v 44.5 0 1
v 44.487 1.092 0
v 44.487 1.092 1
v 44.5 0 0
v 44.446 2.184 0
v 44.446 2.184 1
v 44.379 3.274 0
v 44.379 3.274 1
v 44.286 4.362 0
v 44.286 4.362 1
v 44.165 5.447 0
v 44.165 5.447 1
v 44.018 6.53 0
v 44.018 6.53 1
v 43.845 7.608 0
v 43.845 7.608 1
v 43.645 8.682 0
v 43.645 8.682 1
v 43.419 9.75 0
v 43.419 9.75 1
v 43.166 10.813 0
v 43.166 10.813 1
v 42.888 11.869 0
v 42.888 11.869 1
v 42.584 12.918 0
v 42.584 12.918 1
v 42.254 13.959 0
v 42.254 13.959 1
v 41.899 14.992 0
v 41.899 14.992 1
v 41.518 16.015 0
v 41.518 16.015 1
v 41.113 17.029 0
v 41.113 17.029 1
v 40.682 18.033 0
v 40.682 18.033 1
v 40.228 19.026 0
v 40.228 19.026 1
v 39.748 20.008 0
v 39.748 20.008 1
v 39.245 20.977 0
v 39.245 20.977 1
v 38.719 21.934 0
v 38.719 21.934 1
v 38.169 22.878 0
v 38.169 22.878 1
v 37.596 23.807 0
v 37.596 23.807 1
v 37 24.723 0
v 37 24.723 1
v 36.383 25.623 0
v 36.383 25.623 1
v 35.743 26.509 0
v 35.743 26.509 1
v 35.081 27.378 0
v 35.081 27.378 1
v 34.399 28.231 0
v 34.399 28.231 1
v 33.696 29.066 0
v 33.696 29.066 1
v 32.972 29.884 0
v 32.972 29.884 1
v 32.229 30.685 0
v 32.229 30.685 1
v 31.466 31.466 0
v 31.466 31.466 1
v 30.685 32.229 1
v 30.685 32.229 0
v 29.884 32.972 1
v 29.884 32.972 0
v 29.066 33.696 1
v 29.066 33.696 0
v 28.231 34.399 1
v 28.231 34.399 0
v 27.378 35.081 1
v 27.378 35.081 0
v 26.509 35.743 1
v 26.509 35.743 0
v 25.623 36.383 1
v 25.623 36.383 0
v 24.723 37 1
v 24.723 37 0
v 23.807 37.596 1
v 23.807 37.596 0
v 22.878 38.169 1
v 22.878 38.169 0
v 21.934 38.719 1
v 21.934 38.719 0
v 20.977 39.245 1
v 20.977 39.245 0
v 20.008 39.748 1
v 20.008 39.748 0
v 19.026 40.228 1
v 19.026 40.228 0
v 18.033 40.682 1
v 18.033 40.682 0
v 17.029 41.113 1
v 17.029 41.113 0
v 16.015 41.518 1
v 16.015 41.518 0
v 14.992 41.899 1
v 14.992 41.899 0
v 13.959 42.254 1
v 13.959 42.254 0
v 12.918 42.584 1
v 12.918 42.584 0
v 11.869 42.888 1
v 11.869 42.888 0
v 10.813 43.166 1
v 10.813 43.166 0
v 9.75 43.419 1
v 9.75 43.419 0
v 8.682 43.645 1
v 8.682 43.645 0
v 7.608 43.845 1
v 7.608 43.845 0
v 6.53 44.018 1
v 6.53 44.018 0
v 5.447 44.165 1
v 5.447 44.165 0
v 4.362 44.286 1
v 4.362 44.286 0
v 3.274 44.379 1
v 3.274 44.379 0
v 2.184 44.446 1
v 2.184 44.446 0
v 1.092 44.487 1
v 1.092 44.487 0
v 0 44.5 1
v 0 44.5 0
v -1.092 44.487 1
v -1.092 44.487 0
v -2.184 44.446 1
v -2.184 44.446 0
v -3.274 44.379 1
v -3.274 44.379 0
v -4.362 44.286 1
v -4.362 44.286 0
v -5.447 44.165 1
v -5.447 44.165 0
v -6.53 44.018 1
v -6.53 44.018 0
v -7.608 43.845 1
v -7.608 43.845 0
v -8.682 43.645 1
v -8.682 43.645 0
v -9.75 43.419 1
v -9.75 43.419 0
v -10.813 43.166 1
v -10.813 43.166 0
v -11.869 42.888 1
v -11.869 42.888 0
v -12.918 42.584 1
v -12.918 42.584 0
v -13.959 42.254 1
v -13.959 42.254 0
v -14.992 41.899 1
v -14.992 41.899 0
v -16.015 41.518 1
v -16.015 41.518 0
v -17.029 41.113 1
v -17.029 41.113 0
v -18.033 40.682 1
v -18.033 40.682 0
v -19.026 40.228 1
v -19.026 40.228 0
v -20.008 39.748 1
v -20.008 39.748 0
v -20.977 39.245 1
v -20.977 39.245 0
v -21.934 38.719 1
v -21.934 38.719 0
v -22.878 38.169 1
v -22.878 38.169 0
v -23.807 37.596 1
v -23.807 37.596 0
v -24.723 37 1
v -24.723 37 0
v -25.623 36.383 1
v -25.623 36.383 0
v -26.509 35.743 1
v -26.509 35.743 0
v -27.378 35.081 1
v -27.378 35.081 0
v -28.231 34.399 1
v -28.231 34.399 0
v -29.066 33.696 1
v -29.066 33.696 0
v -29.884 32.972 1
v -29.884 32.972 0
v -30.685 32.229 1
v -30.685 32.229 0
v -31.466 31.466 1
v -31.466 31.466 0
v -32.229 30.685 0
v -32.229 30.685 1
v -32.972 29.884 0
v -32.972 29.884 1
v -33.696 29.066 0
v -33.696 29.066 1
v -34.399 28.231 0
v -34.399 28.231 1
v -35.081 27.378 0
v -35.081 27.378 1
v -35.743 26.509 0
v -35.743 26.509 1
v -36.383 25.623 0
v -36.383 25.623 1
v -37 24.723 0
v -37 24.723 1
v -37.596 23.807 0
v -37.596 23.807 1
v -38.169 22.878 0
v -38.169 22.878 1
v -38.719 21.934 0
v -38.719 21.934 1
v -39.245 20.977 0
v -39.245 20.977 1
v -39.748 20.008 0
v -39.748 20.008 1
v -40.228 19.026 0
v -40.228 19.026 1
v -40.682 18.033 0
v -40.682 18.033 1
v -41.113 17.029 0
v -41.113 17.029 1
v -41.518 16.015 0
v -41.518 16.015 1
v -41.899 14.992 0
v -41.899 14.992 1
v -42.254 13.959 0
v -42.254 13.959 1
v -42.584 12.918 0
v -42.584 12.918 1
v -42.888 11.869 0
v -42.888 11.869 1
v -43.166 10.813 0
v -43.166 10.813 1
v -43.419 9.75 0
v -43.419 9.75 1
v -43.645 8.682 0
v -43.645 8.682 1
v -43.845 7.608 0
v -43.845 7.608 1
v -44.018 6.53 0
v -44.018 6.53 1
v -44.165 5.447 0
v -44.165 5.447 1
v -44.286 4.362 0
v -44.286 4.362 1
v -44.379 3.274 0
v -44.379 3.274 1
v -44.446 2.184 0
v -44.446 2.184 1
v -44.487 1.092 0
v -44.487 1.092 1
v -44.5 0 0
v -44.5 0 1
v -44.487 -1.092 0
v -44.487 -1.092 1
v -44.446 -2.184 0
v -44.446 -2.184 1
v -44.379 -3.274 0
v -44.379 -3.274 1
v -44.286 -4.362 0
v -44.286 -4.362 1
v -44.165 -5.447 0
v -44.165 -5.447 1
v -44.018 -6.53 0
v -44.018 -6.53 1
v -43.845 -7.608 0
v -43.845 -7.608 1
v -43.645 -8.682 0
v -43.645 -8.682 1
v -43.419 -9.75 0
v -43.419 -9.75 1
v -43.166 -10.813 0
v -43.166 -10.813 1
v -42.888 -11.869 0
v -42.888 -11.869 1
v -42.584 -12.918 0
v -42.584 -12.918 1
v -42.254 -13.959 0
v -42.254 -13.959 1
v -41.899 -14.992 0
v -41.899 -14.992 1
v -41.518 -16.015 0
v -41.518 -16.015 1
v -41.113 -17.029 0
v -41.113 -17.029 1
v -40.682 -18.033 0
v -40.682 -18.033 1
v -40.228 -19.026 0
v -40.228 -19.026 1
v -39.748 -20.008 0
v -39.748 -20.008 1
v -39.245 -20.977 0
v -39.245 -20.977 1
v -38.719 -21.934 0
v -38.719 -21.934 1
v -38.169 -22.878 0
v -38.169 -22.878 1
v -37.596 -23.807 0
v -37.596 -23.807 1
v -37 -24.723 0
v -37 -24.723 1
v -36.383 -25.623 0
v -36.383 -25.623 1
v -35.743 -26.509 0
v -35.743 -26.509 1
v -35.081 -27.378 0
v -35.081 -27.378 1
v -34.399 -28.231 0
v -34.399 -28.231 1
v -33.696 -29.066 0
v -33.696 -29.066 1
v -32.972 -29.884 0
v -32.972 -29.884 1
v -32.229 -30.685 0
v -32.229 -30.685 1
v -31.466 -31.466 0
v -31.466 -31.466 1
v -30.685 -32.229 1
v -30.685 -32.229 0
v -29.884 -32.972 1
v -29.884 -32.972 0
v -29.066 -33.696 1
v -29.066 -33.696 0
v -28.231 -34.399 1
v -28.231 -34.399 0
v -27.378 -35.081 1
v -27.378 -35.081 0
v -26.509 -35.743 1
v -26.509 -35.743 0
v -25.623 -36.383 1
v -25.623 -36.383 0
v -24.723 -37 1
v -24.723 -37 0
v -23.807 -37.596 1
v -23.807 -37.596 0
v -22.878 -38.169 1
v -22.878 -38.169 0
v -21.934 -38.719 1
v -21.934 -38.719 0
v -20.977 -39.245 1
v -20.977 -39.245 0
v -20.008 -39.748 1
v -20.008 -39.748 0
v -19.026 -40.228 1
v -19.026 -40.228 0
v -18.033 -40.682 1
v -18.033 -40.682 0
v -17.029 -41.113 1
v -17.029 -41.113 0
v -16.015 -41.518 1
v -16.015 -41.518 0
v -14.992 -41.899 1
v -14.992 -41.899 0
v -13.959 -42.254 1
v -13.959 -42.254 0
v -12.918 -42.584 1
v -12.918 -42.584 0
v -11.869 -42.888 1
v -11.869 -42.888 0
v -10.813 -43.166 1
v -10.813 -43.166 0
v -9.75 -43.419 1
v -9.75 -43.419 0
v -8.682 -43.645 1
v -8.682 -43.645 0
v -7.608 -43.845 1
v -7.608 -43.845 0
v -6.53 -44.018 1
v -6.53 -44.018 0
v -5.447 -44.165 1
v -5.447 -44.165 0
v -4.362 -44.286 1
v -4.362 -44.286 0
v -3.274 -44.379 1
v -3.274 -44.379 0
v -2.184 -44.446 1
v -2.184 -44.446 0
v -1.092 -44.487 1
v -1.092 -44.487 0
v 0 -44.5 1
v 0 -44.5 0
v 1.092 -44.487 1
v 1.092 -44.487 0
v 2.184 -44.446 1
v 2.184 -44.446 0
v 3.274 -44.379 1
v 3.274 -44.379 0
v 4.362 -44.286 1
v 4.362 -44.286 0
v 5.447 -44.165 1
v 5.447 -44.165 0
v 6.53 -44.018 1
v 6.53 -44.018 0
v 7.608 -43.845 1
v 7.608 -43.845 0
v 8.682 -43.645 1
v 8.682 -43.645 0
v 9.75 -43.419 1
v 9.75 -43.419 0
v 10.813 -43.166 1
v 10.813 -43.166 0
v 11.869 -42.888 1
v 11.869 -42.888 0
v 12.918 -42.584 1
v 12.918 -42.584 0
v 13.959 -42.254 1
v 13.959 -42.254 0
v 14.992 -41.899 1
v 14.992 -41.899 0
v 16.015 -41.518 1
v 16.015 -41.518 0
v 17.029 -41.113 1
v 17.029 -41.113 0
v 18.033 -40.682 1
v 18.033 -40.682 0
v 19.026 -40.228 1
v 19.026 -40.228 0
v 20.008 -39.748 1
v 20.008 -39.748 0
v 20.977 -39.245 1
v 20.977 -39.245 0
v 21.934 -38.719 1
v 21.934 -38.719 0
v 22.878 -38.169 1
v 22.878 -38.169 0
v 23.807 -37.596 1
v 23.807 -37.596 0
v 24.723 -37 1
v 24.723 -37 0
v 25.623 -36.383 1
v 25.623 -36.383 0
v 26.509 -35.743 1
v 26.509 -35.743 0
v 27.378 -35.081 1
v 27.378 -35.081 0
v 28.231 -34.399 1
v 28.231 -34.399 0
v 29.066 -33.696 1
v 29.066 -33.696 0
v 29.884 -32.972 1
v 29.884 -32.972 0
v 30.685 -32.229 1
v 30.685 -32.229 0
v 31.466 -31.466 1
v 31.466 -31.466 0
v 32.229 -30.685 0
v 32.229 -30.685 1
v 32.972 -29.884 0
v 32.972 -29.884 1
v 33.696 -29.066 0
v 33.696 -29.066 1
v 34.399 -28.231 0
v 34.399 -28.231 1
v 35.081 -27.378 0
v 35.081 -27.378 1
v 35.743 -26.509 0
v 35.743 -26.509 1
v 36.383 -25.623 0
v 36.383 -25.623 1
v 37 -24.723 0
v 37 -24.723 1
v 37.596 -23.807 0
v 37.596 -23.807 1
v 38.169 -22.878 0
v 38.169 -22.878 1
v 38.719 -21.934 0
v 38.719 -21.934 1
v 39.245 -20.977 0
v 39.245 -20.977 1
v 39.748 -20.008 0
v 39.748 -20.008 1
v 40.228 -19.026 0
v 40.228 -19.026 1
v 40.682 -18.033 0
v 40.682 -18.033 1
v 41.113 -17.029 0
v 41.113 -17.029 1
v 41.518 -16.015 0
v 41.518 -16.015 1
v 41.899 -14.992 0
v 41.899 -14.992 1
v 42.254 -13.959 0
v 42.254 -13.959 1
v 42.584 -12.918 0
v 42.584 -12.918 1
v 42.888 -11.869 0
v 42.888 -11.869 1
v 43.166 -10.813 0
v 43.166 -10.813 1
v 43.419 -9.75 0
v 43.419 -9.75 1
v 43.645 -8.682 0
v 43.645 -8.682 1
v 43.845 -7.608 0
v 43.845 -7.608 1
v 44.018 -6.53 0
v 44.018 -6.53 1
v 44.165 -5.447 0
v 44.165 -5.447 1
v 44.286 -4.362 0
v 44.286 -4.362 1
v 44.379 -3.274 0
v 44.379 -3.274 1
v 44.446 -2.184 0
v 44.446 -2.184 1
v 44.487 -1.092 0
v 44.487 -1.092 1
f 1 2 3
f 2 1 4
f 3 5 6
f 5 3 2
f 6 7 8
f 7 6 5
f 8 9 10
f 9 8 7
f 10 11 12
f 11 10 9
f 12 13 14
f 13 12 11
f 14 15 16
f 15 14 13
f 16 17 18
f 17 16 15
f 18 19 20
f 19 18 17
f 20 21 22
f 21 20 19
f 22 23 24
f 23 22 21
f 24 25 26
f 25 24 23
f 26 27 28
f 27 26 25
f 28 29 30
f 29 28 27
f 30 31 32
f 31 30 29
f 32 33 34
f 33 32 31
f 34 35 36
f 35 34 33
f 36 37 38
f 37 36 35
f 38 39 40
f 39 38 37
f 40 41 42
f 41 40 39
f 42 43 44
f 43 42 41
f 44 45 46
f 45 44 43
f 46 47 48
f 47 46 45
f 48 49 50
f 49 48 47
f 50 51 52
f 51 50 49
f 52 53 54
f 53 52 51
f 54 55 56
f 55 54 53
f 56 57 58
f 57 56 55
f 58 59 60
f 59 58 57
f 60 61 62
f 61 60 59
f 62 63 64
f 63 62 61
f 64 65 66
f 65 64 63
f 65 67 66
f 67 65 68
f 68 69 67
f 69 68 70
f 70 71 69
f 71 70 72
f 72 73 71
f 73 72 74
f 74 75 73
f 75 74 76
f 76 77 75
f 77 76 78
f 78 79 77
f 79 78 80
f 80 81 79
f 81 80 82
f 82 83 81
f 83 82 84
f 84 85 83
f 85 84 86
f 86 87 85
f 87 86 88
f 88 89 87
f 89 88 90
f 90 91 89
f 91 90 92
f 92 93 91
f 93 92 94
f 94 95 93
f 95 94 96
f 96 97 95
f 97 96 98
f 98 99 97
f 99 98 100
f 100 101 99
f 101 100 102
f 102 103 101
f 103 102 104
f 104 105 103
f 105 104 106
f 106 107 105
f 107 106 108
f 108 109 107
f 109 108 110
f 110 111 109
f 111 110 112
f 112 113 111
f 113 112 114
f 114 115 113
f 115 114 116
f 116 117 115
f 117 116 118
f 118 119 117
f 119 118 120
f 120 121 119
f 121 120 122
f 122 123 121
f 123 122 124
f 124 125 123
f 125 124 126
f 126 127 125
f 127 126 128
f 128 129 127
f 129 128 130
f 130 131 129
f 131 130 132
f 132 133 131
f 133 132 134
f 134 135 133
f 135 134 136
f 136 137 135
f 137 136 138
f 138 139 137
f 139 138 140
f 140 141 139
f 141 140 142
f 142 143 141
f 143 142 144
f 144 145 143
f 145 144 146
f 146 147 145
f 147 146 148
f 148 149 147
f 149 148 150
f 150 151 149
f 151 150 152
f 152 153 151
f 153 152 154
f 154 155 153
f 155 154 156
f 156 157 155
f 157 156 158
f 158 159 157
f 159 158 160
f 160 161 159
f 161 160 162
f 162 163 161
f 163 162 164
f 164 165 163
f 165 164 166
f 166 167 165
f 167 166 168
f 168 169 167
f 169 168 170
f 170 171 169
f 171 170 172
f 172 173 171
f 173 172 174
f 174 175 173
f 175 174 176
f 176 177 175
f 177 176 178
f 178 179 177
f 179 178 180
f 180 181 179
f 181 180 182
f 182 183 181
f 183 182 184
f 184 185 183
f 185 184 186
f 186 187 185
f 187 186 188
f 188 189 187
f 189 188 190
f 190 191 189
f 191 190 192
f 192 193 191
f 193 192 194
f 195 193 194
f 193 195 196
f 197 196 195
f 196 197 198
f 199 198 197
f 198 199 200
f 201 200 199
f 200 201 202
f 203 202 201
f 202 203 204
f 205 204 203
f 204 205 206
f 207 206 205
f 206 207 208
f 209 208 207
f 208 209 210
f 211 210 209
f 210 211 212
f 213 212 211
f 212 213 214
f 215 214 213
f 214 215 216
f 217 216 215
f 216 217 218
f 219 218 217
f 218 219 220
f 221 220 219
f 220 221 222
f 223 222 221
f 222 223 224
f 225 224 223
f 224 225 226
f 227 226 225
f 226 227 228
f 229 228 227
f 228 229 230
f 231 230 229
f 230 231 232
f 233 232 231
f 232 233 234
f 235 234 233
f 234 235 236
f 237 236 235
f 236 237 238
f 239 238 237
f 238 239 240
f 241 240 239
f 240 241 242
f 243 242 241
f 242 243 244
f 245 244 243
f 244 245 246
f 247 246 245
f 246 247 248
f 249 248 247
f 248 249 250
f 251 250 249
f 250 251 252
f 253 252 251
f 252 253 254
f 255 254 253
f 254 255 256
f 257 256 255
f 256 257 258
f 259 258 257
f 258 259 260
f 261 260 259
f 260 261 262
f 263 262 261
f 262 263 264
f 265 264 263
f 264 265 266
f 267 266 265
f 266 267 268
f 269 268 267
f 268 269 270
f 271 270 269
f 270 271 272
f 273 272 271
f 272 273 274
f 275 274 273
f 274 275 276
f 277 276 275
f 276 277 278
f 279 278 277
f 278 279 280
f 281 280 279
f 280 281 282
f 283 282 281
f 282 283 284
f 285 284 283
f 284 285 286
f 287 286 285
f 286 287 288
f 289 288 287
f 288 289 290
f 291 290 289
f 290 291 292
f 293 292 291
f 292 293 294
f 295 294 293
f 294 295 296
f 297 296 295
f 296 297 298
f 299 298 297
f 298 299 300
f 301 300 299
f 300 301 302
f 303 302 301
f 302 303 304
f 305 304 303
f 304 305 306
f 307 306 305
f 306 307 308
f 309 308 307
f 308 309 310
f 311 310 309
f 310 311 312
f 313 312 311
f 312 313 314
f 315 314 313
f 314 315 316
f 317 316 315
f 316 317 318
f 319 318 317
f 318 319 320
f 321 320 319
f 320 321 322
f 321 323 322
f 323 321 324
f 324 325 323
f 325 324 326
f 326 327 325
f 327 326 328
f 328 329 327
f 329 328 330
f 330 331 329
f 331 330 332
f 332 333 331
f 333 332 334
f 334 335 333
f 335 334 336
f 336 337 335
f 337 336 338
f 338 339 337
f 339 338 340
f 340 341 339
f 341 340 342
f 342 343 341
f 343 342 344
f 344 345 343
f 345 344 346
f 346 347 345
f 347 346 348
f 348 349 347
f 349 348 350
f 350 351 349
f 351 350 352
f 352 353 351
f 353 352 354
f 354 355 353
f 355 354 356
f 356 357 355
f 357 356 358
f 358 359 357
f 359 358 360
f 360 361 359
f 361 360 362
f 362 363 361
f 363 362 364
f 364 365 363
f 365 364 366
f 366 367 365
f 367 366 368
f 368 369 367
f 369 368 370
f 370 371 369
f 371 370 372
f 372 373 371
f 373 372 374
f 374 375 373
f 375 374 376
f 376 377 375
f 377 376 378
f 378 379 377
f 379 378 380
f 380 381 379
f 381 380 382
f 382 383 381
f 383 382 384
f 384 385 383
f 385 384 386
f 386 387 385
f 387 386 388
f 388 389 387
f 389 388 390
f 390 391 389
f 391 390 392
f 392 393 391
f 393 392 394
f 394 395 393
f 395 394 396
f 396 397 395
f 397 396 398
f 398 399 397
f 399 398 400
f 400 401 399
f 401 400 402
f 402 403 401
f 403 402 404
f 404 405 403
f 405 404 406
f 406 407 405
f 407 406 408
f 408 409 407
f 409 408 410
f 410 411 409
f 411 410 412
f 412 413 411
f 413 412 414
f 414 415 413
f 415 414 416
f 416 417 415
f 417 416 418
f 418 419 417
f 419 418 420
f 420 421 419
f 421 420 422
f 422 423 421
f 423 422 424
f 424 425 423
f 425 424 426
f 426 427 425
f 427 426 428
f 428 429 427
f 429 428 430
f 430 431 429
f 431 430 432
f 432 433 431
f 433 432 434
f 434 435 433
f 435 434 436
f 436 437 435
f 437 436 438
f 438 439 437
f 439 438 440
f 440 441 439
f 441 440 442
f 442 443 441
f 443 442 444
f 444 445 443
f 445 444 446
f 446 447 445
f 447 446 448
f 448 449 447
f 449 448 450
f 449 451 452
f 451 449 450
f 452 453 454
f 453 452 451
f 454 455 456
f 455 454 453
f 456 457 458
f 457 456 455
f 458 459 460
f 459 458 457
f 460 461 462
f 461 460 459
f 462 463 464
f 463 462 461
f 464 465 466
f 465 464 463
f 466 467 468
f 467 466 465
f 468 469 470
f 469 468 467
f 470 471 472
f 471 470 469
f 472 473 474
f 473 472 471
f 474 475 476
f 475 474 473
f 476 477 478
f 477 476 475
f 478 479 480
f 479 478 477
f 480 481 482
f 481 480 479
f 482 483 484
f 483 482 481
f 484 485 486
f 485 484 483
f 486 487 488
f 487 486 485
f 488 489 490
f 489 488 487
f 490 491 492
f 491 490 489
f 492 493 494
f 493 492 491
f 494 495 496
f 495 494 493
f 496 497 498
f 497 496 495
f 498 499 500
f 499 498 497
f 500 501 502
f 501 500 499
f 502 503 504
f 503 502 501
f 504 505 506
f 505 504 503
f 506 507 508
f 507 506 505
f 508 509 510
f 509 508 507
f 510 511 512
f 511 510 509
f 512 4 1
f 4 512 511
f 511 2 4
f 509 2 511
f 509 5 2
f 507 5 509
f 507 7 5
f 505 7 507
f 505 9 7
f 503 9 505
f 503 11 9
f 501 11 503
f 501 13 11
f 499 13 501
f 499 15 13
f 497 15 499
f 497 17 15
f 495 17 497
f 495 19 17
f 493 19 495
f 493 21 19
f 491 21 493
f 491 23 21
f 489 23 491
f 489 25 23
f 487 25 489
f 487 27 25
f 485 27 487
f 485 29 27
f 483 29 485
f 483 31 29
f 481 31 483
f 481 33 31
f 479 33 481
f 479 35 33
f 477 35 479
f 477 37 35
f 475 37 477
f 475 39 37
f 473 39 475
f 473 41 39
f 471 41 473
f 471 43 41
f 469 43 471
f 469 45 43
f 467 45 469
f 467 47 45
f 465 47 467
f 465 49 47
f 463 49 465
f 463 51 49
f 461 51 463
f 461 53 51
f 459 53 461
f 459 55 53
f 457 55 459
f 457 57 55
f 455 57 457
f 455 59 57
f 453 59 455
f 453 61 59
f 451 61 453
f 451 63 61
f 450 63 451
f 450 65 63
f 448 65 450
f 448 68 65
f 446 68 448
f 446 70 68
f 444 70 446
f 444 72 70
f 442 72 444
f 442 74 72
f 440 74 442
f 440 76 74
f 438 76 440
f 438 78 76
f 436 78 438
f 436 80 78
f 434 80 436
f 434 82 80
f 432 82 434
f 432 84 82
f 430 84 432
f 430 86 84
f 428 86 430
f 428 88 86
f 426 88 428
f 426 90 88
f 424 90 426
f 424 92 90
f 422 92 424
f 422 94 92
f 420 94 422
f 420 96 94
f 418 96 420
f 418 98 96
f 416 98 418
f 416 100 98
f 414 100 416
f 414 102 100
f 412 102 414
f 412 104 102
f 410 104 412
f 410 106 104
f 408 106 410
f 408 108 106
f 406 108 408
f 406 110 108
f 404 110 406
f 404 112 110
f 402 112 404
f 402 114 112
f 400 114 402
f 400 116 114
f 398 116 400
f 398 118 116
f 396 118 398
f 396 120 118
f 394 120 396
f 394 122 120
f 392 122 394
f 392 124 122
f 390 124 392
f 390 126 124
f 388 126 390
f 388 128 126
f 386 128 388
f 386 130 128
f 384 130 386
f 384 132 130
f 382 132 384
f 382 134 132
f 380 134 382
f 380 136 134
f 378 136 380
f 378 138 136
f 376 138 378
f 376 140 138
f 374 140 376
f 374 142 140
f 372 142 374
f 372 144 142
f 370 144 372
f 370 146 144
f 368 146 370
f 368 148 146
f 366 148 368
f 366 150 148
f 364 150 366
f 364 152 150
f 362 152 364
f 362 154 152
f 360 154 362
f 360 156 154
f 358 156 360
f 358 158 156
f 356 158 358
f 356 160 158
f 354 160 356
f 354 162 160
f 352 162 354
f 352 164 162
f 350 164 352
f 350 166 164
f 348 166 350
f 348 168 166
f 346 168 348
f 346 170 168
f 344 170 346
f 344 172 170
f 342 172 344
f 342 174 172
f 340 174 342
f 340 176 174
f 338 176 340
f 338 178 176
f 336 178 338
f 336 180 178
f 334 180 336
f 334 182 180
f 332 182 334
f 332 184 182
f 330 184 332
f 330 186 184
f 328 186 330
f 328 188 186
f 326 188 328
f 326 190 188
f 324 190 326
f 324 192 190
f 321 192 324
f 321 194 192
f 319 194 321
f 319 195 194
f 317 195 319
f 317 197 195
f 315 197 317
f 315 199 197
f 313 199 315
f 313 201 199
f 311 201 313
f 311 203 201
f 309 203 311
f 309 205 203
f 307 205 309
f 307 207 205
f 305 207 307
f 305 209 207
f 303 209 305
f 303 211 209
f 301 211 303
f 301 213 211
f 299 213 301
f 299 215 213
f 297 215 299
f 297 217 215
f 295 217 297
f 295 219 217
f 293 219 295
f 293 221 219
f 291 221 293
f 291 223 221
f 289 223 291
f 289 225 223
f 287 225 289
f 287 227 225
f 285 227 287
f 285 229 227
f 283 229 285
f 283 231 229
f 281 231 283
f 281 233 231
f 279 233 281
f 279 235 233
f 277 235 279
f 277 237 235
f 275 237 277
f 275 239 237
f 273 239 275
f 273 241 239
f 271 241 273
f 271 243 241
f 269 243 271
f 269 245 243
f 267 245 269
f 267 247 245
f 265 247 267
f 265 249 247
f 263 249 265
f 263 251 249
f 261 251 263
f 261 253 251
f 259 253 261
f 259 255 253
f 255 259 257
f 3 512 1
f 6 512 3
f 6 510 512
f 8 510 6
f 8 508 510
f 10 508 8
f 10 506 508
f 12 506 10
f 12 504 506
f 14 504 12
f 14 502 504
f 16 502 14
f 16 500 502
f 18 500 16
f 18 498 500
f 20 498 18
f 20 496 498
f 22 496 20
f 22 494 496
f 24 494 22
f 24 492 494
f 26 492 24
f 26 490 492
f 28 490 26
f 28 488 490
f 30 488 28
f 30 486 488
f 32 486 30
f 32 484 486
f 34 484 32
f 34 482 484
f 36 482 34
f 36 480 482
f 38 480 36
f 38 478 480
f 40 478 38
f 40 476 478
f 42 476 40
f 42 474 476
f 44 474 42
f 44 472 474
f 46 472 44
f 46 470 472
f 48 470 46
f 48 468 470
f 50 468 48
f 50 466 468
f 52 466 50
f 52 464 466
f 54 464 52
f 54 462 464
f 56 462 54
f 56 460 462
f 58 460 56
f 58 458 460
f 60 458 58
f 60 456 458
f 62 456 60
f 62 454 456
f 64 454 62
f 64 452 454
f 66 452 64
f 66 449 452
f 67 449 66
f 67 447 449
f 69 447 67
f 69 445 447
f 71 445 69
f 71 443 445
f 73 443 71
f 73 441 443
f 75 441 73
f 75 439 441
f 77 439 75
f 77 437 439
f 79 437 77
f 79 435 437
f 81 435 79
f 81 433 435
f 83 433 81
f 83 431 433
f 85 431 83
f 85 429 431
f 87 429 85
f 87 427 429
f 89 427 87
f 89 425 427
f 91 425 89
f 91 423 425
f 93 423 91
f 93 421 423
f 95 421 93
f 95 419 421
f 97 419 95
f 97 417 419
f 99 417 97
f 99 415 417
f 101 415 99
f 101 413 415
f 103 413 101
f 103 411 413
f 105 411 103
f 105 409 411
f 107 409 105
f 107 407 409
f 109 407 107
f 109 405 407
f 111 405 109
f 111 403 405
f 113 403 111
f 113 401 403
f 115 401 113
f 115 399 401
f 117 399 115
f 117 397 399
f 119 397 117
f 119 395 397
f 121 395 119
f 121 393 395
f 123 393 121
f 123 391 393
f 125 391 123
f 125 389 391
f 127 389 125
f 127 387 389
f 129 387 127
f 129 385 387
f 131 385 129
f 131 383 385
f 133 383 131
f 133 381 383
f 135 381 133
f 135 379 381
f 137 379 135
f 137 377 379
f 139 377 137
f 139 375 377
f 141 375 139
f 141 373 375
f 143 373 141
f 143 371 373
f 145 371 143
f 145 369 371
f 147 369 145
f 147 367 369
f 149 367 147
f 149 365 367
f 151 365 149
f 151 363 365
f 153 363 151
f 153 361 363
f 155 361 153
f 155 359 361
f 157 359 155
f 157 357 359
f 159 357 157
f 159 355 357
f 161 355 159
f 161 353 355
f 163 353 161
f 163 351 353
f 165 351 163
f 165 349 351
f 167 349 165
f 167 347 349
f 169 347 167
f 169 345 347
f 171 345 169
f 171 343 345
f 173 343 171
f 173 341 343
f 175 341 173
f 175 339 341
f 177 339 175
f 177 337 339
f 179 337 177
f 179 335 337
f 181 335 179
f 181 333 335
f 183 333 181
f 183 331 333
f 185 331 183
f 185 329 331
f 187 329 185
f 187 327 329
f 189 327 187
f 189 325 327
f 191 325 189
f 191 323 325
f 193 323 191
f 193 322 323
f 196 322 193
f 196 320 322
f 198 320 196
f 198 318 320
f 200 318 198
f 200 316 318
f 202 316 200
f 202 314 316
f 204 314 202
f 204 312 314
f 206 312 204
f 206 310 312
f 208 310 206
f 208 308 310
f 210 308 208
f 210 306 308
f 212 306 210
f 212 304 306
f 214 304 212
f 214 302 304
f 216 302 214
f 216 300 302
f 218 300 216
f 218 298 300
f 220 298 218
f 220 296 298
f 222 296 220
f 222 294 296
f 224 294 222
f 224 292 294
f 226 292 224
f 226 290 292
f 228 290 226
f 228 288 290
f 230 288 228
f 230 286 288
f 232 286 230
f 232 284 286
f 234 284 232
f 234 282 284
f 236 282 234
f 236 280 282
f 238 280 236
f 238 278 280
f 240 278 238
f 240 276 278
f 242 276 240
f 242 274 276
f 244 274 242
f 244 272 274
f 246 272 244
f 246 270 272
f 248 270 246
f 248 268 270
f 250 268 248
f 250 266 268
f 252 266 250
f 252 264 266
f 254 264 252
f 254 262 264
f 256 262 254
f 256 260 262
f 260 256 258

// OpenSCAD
module render()
{
  disk_radius = 89.0 / 2.0;
  thickness = 1.0;
  fn = 256;

  cylinder(h = thickness,
           r1 = disk_radius,
           r2 = disk_radius, $fn=fn);
}

echo(version=version());

render();
